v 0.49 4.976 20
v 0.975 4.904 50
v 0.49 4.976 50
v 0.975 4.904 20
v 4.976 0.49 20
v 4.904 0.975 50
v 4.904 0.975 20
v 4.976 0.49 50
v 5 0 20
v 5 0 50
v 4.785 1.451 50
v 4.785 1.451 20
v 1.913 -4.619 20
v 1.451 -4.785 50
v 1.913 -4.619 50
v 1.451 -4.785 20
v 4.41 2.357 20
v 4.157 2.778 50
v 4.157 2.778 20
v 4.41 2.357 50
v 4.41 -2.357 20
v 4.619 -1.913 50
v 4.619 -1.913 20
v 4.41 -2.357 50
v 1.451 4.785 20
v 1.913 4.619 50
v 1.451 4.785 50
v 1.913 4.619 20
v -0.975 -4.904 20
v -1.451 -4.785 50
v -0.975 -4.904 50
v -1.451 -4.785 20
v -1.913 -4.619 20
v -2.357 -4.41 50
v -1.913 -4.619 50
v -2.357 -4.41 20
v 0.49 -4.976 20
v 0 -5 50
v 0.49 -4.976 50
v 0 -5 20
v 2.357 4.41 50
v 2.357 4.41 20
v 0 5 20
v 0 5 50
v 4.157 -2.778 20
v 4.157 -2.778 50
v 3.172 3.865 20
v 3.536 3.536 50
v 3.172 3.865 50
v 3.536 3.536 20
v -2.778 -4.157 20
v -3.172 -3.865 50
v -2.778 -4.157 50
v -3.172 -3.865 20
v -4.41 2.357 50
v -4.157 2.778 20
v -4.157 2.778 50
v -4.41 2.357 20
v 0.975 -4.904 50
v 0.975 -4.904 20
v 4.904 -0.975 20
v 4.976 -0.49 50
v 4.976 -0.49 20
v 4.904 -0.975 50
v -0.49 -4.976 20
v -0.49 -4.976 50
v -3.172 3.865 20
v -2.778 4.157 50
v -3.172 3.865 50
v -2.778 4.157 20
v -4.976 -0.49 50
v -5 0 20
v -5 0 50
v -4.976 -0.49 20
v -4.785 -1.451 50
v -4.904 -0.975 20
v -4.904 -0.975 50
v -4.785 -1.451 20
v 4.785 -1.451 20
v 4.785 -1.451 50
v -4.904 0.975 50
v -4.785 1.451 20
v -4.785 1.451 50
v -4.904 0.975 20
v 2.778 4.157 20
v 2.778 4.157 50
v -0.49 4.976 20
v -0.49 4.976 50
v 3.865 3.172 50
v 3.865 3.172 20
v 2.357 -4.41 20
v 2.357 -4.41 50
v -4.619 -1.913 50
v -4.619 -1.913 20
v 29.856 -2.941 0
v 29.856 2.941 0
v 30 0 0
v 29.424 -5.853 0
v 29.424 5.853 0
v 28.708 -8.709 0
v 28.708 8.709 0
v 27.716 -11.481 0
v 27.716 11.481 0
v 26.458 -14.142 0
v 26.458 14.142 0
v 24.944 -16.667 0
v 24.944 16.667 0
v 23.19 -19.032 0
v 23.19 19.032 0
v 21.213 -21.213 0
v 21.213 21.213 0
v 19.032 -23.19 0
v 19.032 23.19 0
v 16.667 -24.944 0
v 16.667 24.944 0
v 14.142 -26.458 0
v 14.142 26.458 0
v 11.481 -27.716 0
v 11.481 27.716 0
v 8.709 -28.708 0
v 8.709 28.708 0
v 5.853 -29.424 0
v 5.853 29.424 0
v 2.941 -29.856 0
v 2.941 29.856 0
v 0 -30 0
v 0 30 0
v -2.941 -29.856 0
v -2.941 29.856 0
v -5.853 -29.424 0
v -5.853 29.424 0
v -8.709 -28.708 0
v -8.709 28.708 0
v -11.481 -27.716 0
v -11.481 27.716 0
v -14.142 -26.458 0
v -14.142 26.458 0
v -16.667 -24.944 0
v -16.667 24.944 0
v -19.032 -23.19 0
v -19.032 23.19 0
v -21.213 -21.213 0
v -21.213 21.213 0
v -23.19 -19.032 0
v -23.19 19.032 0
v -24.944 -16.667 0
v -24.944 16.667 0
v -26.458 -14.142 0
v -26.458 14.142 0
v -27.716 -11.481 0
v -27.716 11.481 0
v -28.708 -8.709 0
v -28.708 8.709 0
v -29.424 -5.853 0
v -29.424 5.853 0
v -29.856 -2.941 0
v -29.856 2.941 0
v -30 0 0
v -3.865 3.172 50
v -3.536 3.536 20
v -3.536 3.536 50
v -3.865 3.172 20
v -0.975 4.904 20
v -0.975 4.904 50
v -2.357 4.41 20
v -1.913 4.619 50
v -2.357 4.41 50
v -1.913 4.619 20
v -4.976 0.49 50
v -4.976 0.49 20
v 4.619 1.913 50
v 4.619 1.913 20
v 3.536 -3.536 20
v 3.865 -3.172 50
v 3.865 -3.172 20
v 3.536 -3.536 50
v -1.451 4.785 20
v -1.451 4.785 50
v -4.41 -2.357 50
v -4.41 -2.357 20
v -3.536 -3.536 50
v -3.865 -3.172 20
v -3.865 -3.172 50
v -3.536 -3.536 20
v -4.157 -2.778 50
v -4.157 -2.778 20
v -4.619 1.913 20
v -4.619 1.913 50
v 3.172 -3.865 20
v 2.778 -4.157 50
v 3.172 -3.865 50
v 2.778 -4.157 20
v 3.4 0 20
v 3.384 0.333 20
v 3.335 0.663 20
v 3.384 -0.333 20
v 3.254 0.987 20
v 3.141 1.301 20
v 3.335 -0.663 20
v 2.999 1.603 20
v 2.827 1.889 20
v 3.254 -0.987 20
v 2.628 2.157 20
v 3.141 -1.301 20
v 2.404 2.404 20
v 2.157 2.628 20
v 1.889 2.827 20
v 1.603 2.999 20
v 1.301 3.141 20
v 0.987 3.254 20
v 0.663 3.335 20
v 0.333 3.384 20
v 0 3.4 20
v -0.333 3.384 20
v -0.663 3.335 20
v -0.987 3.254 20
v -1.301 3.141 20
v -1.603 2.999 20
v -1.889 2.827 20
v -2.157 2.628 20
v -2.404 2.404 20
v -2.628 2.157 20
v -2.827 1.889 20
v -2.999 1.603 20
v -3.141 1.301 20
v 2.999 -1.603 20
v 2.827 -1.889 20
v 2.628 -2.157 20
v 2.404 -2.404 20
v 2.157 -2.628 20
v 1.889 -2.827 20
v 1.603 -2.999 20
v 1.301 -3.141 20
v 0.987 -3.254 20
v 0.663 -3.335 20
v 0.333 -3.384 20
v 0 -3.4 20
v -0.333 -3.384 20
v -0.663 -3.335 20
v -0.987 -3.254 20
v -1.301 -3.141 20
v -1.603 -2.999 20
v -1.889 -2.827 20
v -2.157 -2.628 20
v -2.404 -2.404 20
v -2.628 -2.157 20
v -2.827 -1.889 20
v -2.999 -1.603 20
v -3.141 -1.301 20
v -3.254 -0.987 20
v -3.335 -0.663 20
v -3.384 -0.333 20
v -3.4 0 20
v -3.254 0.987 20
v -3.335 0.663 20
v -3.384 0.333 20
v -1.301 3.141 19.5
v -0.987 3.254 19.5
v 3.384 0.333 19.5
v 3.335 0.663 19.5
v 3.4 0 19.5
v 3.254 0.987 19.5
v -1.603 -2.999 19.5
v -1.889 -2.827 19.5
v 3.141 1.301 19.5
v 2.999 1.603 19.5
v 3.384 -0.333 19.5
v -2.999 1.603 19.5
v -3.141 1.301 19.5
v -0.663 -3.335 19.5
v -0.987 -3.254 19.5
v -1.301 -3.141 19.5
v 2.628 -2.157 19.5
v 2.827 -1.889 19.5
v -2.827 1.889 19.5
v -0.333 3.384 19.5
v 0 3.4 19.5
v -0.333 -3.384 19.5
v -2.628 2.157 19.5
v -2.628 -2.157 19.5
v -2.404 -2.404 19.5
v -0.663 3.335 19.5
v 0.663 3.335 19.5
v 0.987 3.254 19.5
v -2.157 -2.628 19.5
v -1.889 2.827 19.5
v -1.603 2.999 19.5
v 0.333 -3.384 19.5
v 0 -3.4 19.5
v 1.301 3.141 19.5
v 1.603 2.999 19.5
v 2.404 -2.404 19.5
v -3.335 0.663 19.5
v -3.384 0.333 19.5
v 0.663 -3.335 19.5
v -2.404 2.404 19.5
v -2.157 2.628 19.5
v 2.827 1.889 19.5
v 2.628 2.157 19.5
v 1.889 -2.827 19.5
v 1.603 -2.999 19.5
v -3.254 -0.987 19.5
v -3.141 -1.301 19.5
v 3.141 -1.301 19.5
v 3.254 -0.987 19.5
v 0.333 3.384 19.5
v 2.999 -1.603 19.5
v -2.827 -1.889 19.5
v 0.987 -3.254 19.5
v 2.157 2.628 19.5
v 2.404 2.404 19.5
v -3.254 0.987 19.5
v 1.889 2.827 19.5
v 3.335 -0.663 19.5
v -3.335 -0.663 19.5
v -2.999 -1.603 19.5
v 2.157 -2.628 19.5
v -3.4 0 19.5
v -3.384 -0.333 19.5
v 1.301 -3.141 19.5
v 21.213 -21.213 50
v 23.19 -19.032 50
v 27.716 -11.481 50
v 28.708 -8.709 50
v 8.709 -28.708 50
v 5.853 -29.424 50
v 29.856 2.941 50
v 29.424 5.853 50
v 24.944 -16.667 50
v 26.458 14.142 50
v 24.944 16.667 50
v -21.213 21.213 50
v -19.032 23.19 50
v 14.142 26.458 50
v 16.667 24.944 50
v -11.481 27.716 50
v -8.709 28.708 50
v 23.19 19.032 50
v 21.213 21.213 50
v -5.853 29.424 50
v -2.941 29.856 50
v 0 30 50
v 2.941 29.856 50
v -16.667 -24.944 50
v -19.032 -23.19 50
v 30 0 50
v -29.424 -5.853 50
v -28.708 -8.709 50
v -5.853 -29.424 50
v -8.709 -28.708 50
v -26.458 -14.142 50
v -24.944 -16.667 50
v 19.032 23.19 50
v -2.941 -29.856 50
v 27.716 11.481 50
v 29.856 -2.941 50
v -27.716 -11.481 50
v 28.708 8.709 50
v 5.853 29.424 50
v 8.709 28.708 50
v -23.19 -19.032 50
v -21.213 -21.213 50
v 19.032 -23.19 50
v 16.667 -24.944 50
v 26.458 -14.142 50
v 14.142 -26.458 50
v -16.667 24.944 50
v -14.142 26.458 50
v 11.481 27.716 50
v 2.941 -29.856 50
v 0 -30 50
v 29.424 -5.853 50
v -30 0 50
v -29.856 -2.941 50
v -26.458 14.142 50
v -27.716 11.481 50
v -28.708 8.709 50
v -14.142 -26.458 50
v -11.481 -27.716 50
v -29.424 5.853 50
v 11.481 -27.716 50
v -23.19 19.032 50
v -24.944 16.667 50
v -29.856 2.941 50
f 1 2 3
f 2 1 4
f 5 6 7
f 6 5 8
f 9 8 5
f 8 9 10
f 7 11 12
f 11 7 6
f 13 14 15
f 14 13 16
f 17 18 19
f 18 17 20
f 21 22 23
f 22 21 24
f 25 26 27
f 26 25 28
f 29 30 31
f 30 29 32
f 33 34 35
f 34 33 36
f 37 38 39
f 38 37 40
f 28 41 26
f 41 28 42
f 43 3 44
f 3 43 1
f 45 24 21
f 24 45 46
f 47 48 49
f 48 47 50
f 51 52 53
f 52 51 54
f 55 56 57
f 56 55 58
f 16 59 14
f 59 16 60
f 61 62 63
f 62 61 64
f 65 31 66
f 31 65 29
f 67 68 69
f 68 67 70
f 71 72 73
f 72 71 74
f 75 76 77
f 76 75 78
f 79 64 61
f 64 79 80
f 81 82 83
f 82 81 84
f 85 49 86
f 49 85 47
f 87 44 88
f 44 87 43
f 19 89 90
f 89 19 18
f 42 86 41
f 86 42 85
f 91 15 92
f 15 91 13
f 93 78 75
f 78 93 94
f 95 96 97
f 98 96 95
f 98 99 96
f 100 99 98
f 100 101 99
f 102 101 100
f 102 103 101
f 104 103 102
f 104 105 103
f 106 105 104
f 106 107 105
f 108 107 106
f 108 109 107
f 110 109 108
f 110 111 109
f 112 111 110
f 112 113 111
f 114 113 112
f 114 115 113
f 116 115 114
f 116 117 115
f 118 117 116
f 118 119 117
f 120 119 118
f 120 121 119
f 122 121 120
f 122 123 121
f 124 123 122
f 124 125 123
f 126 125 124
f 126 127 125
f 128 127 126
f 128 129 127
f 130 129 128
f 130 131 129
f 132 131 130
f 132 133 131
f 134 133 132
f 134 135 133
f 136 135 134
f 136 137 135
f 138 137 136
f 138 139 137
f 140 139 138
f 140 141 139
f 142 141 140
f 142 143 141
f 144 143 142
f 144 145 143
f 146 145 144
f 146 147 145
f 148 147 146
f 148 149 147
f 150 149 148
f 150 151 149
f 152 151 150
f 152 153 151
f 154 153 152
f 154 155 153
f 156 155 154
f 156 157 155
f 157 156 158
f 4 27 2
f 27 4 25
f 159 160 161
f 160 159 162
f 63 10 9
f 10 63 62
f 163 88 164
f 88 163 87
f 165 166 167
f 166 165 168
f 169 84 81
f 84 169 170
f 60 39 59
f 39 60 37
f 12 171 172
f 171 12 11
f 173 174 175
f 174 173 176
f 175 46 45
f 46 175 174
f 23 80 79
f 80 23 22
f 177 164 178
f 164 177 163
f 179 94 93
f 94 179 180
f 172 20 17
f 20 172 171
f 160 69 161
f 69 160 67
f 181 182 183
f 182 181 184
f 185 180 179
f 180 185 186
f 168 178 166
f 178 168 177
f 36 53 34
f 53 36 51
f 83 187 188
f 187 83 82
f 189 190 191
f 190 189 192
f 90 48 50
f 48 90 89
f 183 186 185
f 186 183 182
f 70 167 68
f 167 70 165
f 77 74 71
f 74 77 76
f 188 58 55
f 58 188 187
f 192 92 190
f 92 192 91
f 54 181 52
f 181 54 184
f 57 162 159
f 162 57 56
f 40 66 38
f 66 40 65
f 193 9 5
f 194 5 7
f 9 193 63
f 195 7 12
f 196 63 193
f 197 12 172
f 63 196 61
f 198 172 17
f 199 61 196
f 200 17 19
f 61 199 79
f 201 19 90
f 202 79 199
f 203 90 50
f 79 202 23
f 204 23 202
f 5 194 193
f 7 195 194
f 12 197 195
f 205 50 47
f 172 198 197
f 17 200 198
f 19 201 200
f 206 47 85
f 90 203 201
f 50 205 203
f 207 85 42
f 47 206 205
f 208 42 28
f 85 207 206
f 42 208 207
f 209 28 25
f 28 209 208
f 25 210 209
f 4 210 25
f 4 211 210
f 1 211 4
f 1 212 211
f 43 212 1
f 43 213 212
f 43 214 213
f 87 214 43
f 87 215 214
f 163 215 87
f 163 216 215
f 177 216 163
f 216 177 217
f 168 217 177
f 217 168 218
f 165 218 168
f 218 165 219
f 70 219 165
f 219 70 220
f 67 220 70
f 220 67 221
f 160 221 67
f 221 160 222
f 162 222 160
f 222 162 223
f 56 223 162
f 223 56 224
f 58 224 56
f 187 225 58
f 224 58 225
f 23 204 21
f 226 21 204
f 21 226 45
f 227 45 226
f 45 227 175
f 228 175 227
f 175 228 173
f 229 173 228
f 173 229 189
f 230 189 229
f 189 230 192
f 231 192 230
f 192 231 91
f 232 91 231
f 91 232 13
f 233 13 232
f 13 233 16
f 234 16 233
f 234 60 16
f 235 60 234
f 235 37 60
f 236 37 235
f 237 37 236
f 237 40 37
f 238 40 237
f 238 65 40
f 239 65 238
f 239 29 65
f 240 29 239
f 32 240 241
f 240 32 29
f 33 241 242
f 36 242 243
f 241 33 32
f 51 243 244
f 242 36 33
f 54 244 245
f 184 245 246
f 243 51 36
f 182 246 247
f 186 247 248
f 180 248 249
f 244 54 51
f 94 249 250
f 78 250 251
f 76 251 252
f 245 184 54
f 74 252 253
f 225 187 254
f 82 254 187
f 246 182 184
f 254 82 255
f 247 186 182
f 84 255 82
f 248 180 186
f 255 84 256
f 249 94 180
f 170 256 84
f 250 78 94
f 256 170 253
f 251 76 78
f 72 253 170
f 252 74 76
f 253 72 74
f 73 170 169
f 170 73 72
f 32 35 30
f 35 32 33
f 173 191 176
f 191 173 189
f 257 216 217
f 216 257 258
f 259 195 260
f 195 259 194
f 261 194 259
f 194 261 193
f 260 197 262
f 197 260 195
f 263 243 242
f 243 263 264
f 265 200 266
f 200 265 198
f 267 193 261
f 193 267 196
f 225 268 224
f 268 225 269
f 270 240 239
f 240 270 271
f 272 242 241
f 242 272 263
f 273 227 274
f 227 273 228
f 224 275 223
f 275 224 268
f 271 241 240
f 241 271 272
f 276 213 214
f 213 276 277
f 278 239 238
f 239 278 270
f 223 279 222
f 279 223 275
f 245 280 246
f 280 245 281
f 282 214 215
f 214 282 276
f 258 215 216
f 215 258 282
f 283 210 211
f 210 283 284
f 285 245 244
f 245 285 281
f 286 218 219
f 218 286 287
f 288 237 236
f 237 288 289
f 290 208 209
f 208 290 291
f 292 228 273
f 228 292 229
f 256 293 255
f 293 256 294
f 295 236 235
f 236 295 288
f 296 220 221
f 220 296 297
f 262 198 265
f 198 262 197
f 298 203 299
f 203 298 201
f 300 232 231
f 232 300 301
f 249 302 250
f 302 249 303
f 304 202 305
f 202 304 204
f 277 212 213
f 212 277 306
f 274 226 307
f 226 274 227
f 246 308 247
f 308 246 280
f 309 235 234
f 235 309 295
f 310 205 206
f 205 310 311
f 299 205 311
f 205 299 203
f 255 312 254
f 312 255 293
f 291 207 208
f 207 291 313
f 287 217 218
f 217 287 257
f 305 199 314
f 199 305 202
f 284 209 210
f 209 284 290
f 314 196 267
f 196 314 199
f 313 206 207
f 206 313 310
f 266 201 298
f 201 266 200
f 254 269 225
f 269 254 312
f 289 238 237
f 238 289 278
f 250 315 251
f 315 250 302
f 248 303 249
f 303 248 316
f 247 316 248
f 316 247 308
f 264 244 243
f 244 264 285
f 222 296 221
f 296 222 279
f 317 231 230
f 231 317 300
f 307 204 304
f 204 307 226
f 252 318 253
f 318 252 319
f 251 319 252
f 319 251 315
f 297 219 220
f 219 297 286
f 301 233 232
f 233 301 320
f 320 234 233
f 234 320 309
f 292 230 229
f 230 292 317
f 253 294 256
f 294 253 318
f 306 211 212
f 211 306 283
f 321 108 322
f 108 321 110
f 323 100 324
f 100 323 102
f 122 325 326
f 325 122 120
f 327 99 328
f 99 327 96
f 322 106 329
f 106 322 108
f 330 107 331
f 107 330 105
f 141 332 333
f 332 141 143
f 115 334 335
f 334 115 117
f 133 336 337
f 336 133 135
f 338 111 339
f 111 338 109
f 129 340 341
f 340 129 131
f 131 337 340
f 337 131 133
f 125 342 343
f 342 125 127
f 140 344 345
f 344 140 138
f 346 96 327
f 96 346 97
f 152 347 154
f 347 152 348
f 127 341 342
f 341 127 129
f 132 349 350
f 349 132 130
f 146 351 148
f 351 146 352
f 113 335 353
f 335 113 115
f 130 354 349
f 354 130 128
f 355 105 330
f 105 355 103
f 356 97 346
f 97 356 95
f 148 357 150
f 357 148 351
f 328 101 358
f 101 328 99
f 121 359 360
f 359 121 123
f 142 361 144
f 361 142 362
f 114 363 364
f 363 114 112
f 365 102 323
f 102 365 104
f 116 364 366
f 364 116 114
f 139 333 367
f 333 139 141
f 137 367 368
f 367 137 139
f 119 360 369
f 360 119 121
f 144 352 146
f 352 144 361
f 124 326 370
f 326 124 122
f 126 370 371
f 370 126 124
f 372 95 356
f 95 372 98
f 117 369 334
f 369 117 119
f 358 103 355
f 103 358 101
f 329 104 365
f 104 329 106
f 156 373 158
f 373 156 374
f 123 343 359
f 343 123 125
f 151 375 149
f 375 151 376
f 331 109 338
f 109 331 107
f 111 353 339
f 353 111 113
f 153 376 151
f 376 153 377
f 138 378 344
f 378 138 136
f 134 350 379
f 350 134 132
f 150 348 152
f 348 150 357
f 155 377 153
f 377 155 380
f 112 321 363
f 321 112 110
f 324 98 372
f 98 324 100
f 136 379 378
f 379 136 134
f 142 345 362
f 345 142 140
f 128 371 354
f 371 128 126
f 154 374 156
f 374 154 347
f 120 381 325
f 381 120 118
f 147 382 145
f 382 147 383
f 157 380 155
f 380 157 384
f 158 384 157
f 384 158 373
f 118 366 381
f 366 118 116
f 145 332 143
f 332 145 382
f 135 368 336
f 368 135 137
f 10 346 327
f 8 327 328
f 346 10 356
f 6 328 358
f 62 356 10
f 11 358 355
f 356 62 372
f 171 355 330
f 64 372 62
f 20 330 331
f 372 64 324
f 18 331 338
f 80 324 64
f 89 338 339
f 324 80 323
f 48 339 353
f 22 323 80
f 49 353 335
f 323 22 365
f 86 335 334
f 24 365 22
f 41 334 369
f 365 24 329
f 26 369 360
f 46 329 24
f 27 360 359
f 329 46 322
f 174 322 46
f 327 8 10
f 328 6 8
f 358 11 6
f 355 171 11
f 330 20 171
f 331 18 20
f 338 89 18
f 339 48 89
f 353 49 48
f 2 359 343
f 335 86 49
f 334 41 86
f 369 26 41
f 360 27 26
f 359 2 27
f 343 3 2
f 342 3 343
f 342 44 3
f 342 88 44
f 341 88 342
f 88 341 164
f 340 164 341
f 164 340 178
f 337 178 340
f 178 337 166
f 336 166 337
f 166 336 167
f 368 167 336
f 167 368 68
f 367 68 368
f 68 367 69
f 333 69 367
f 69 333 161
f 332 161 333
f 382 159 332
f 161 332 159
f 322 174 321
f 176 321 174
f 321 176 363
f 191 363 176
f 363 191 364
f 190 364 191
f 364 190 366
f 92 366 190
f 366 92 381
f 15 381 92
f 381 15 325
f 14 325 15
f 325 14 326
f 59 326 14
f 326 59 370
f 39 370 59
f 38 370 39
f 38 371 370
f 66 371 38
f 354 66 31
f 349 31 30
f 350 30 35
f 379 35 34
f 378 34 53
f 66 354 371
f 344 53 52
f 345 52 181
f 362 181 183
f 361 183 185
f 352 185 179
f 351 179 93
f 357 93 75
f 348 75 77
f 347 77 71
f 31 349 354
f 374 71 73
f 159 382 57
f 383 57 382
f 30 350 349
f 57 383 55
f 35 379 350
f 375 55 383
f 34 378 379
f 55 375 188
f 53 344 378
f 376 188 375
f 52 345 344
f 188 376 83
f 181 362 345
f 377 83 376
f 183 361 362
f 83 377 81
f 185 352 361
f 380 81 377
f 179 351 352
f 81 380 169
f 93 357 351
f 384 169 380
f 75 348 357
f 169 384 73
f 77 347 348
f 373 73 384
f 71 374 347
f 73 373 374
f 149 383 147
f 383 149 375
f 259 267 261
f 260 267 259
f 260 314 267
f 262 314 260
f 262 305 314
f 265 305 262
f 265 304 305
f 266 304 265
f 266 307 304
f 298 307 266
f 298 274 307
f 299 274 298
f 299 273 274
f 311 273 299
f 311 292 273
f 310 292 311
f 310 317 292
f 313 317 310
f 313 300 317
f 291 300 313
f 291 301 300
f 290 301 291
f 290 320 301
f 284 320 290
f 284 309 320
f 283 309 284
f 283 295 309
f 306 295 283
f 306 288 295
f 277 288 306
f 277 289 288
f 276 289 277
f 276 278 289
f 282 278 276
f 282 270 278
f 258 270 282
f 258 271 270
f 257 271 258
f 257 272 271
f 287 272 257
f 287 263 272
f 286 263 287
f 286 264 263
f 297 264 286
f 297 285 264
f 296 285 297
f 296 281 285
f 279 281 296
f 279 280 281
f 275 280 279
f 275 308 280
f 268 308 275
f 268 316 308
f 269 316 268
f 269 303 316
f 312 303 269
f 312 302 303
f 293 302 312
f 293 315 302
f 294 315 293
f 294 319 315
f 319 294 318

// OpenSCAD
// Funnel with spout - printed upright, wide opening at the top
// Units: mm. Wall thickness 1.6 mm throughout.

// ---------- Parameters ----------
spout_d        = 10;    // spout outer diameter
spout_bore     = spout_d - 2 * 1.6;  // spout bore (6.8 mm)
spout_h        = 20;    // spout height (z = 0 to 20)
cone_top_d     = 10;    // cone outer diameter at z = 20 (top of spout)
cone_rim_d     = 60;    // cone outer diameter at rim (z = 50)
cone_h         = cone_rim_d - cone_top_d;  // cone height (40 mm)
eps            = 0.5;   // cutter overshoot past faces

$fn = 64;

// ---------- Model ----------
union() {
    // Spout: tube from z = 0 to 20, open at both ends
    difference() {
        cylinder(d = spout_d, h = spout_h);
        translate([0, 0, -eps])
            cylinder(d = spout_bore, h = spout_h + 2 * eps);
    }

    // Cone: widens from 10 mm at z = 20 to 60 mm at z = 50, open top and bottom
    difference() {
        cylinder(d = cone_rim_d, h = cone_h, $fn = 64);
        translate([0, 0, spout_h - eps])
            cylinder(d = cone_top_d, h = cone_h + eps, $fn = 64);
    }
}
